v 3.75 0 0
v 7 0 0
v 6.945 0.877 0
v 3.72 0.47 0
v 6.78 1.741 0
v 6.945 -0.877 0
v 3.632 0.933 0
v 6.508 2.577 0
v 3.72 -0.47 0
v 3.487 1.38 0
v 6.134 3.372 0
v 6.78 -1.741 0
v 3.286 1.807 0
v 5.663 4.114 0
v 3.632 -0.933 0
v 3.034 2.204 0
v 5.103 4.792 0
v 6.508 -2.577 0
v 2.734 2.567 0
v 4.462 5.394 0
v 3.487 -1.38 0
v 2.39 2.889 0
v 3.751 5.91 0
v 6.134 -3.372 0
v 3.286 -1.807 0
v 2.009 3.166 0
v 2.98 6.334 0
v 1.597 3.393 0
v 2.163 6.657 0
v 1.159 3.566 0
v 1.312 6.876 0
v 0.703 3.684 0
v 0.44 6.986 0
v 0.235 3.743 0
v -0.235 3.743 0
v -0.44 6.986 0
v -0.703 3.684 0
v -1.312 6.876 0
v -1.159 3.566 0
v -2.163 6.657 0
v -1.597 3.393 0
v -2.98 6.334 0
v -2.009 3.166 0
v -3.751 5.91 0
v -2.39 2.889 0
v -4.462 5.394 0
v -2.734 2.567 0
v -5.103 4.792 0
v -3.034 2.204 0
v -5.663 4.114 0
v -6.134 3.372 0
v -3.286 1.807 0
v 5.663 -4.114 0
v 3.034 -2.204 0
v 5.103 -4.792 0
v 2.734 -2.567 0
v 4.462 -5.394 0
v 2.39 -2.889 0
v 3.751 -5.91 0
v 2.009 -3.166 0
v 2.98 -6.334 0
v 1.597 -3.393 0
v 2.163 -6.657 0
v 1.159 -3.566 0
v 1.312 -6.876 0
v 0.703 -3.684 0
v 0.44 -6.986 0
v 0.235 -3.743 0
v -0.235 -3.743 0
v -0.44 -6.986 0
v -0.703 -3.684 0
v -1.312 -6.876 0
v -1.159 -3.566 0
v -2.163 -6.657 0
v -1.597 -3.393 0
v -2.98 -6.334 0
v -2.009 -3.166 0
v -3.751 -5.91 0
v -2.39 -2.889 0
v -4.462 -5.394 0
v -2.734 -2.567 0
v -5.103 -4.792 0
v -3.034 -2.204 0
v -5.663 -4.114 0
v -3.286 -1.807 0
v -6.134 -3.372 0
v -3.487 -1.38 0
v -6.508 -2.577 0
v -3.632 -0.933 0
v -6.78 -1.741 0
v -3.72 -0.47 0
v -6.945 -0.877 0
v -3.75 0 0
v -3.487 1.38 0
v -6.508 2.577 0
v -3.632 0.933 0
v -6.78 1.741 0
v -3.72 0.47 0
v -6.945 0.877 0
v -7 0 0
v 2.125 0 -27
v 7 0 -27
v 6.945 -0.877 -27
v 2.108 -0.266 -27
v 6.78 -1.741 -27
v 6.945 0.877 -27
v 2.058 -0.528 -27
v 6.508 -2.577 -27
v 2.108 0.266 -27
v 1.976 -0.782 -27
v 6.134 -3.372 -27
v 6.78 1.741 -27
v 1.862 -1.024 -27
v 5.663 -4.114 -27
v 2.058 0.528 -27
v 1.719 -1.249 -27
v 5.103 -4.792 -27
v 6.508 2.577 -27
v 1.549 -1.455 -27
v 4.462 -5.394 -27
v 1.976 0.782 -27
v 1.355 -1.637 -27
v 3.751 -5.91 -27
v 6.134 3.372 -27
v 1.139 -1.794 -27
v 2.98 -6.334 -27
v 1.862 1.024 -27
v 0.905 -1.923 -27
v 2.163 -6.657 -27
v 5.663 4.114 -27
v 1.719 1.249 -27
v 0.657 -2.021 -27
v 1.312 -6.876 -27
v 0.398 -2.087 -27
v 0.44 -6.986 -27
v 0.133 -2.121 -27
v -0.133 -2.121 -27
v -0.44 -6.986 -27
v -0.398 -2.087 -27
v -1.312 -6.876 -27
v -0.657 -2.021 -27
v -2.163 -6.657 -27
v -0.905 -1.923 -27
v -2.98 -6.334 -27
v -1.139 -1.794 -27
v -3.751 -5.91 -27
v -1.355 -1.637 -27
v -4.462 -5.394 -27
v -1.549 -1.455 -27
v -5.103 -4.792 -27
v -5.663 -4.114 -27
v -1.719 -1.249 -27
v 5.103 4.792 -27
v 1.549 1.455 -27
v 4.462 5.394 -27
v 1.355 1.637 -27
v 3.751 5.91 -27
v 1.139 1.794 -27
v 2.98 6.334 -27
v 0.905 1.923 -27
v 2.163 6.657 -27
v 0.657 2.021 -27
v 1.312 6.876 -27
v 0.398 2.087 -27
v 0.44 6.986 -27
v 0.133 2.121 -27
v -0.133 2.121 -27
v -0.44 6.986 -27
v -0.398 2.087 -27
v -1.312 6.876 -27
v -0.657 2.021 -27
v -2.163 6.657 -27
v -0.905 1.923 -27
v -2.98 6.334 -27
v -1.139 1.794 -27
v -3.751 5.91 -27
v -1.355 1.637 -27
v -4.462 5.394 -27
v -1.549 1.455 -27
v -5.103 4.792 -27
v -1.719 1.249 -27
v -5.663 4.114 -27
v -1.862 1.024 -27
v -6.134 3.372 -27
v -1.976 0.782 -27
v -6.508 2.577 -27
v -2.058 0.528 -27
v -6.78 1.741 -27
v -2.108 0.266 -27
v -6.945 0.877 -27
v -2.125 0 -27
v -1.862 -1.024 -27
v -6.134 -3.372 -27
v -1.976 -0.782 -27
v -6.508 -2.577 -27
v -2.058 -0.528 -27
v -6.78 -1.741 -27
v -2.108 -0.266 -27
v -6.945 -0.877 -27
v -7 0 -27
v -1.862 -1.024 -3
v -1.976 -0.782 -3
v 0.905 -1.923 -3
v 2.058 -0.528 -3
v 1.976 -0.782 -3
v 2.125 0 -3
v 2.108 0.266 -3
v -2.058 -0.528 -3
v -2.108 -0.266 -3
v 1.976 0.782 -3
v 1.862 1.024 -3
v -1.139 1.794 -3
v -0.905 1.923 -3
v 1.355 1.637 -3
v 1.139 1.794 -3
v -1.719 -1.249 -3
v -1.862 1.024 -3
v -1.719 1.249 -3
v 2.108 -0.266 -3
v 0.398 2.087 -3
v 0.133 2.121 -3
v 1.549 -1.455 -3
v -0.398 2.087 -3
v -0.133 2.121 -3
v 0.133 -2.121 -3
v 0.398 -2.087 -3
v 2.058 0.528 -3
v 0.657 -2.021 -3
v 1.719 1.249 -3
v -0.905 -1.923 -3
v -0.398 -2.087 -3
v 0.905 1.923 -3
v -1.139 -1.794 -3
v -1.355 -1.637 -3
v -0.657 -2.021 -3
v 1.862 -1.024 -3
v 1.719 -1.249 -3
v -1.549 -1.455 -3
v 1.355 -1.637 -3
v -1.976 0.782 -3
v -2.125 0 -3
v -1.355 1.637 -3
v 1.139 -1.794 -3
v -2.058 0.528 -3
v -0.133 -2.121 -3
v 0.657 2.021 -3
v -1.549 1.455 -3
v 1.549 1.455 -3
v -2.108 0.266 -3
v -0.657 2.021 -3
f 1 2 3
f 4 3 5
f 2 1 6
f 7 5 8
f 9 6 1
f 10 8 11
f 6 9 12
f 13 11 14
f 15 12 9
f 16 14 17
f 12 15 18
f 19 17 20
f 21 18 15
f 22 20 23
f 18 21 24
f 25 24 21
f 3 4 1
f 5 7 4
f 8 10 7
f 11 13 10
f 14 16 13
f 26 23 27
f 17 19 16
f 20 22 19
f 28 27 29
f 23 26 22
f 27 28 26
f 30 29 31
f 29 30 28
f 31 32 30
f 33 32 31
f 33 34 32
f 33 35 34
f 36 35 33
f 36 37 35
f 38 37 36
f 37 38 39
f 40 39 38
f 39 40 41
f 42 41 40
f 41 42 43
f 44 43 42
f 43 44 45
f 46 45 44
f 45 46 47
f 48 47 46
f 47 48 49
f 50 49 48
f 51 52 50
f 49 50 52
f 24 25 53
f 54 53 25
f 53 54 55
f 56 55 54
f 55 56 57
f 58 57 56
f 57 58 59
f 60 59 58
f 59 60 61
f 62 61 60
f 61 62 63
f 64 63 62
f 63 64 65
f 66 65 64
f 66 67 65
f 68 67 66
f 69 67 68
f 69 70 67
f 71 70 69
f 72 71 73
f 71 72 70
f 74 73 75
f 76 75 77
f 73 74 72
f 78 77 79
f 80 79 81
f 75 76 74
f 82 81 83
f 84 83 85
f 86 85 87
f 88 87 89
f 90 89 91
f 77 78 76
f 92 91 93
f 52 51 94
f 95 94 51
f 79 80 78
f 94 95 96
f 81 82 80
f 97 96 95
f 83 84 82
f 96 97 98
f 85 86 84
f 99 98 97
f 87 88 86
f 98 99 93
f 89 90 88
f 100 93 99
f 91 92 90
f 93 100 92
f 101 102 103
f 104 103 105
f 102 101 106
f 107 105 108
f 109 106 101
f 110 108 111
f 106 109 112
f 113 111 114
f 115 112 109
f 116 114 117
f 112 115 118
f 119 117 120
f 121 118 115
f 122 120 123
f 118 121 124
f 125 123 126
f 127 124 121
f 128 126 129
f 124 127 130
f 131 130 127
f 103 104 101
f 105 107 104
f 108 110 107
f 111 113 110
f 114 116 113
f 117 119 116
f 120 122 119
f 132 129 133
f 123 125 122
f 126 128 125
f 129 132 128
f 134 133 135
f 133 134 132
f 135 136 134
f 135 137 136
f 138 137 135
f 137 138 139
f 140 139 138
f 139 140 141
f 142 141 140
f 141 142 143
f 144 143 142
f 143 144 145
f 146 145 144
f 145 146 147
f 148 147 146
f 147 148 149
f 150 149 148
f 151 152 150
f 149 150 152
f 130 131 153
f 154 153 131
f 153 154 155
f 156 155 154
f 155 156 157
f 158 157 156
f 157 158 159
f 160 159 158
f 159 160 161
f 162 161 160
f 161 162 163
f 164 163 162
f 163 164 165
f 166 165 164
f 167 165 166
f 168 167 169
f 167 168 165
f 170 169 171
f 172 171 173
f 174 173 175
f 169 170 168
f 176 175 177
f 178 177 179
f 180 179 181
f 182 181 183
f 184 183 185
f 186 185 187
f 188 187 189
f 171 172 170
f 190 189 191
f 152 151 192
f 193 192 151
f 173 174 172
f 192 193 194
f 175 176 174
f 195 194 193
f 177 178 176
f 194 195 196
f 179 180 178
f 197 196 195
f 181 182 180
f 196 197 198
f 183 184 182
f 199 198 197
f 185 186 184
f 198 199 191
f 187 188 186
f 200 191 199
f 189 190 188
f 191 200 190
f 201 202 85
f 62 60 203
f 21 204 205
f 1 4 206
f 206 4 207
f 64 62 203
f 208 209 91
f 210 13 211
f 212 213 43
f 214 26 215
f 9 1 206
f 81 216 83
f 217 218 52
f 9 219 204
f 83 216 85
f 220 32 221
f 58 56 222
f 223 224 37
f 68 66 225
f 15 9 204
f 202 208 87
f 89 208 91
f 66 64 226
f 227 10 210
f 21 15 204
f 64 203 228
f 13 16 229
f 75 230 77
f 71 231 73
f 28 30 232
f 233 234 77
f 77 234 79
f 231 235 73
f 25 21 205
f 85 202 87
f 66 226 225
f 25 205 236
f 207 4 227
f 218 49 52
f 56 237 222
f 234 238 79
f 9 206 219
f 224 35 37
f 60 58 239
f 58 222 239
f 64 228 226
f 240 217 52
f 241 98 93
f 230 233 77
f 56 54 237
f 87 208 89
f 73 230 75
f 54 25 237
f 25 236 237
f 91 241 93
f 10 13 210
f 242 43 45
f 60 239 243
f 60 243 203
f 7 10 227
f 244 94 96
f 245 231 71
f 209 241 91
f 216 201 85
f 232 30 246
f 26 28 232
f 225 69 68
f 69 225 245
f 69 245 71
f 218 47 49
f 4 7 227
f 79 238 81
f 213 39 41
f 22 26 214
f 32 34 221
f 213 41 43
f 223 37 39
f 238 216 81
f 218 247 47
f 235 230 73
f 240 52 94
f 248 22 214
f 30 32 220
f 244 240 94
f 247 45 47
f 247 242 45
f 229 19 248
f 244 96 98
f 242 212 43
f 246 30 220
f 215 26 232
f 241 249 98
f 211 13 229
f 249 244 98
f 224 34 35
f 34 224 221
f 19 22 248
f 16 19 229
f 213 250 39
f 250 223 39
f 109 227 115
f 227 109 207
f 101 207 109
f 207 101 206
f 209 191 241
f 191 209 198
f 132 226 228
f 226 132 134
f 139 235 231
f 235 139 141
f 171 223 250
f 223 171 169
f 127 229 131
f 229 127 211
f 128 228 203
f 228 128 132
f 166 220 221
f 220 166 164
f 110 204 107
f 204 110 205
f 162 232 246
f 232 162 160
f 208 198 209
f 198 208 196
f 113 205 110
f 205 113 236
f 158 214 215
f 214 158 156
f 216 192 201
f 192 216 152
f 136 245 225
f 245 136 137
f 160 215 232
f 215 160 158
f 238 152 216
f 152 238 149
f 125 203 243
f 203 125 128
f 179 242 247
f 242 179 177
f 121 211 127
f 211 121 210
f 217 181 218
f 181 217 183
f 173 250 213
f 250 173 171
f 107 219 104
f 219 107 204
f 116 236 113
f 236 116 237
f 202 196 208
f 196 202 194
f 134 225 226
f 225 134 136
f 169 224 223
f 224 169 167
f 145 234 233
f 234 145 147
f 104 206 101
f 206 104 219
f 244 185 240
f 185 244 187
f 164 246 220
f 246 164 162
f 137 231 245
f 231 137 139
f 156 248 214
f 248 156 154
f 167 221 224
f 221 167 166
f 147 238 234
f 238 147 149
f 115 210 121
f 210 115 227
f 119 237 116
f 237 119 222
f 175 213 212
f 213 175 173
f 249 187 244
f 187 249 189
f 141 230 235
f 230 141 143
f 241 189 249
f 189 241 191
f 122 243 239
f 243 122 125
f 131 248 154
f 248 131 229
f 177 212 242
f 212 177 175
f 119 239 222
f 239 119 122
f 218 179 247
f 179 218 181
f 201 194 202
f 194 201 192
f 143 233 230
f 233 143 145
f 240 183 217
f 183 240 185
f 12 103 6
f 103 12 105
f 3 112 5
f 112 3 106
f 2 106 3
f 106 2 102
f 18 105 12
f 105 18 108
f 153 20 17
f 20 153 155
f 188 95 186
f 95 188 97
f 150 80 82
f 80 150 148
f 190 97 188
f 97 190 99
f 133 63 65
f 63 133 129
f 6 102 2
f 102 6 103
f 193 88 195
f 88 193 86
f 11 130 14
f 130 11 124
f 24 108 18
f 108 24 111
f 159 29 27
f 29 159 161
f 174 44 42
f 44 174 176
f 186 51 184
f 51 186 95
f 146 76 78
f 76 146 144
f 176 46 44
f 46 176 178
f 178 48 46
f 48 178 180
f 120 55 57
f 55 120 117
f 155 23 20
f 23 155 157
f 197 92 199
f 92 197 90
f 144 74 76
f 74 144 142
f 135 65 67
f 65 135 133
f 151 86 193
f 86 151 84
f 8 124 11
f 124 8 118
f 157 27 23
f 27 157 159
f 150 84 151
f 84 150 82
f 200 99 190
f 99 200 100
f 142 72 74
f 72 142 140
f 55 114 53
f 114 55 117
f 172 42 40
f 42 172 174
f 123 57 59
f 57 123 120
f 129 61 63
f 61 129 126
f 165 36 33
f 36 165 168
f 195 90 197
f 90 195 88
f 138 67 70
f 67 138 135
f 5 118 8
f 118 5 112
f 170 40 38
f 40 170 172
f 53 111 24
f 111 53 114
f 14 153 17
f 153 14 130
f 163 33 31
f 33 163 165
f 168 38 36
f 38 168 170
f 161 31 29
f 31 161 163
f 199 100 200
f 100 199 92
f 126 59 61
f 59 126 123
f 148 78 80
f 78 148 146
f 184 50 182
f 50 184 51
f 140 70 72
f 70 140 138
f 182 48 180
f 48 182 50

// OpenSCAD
$fn = 50;


difference() {
	union() {
		translate(v = [0, 0, -27.0000000000]) {
			cylinder(h = 27, r = 7.0000000000);
		}
		cylinder(h = 0, r = 17.0000000000);
	}
	union() {
		translate(v = [0, 0, 0]) {
			rotate(a = [0, 0, 0]) {
				difference() {
					union() {
						#translate(v = [0, 0, -27.0000000000]) {
							cylinder(h = 27, r = 2.0000000000);
						}
						#translate(v = [0, 0, -3]) {
							cylinder(h = 3, r = 7.0000000000, r1 = 2.1250000000, r2 = 3.7500000000);
						}
						#translate(v = [0, 0, -27.0000000000]) {
							cylinder(h = 27, r = 2.1250000000);
						}
						#translate(v = [0, 0, -27.0000000000]) {
							cylinder(h = 27, r = 2.0000000000);
						}
					}
					union();
				}
			}
		}
	}
}
